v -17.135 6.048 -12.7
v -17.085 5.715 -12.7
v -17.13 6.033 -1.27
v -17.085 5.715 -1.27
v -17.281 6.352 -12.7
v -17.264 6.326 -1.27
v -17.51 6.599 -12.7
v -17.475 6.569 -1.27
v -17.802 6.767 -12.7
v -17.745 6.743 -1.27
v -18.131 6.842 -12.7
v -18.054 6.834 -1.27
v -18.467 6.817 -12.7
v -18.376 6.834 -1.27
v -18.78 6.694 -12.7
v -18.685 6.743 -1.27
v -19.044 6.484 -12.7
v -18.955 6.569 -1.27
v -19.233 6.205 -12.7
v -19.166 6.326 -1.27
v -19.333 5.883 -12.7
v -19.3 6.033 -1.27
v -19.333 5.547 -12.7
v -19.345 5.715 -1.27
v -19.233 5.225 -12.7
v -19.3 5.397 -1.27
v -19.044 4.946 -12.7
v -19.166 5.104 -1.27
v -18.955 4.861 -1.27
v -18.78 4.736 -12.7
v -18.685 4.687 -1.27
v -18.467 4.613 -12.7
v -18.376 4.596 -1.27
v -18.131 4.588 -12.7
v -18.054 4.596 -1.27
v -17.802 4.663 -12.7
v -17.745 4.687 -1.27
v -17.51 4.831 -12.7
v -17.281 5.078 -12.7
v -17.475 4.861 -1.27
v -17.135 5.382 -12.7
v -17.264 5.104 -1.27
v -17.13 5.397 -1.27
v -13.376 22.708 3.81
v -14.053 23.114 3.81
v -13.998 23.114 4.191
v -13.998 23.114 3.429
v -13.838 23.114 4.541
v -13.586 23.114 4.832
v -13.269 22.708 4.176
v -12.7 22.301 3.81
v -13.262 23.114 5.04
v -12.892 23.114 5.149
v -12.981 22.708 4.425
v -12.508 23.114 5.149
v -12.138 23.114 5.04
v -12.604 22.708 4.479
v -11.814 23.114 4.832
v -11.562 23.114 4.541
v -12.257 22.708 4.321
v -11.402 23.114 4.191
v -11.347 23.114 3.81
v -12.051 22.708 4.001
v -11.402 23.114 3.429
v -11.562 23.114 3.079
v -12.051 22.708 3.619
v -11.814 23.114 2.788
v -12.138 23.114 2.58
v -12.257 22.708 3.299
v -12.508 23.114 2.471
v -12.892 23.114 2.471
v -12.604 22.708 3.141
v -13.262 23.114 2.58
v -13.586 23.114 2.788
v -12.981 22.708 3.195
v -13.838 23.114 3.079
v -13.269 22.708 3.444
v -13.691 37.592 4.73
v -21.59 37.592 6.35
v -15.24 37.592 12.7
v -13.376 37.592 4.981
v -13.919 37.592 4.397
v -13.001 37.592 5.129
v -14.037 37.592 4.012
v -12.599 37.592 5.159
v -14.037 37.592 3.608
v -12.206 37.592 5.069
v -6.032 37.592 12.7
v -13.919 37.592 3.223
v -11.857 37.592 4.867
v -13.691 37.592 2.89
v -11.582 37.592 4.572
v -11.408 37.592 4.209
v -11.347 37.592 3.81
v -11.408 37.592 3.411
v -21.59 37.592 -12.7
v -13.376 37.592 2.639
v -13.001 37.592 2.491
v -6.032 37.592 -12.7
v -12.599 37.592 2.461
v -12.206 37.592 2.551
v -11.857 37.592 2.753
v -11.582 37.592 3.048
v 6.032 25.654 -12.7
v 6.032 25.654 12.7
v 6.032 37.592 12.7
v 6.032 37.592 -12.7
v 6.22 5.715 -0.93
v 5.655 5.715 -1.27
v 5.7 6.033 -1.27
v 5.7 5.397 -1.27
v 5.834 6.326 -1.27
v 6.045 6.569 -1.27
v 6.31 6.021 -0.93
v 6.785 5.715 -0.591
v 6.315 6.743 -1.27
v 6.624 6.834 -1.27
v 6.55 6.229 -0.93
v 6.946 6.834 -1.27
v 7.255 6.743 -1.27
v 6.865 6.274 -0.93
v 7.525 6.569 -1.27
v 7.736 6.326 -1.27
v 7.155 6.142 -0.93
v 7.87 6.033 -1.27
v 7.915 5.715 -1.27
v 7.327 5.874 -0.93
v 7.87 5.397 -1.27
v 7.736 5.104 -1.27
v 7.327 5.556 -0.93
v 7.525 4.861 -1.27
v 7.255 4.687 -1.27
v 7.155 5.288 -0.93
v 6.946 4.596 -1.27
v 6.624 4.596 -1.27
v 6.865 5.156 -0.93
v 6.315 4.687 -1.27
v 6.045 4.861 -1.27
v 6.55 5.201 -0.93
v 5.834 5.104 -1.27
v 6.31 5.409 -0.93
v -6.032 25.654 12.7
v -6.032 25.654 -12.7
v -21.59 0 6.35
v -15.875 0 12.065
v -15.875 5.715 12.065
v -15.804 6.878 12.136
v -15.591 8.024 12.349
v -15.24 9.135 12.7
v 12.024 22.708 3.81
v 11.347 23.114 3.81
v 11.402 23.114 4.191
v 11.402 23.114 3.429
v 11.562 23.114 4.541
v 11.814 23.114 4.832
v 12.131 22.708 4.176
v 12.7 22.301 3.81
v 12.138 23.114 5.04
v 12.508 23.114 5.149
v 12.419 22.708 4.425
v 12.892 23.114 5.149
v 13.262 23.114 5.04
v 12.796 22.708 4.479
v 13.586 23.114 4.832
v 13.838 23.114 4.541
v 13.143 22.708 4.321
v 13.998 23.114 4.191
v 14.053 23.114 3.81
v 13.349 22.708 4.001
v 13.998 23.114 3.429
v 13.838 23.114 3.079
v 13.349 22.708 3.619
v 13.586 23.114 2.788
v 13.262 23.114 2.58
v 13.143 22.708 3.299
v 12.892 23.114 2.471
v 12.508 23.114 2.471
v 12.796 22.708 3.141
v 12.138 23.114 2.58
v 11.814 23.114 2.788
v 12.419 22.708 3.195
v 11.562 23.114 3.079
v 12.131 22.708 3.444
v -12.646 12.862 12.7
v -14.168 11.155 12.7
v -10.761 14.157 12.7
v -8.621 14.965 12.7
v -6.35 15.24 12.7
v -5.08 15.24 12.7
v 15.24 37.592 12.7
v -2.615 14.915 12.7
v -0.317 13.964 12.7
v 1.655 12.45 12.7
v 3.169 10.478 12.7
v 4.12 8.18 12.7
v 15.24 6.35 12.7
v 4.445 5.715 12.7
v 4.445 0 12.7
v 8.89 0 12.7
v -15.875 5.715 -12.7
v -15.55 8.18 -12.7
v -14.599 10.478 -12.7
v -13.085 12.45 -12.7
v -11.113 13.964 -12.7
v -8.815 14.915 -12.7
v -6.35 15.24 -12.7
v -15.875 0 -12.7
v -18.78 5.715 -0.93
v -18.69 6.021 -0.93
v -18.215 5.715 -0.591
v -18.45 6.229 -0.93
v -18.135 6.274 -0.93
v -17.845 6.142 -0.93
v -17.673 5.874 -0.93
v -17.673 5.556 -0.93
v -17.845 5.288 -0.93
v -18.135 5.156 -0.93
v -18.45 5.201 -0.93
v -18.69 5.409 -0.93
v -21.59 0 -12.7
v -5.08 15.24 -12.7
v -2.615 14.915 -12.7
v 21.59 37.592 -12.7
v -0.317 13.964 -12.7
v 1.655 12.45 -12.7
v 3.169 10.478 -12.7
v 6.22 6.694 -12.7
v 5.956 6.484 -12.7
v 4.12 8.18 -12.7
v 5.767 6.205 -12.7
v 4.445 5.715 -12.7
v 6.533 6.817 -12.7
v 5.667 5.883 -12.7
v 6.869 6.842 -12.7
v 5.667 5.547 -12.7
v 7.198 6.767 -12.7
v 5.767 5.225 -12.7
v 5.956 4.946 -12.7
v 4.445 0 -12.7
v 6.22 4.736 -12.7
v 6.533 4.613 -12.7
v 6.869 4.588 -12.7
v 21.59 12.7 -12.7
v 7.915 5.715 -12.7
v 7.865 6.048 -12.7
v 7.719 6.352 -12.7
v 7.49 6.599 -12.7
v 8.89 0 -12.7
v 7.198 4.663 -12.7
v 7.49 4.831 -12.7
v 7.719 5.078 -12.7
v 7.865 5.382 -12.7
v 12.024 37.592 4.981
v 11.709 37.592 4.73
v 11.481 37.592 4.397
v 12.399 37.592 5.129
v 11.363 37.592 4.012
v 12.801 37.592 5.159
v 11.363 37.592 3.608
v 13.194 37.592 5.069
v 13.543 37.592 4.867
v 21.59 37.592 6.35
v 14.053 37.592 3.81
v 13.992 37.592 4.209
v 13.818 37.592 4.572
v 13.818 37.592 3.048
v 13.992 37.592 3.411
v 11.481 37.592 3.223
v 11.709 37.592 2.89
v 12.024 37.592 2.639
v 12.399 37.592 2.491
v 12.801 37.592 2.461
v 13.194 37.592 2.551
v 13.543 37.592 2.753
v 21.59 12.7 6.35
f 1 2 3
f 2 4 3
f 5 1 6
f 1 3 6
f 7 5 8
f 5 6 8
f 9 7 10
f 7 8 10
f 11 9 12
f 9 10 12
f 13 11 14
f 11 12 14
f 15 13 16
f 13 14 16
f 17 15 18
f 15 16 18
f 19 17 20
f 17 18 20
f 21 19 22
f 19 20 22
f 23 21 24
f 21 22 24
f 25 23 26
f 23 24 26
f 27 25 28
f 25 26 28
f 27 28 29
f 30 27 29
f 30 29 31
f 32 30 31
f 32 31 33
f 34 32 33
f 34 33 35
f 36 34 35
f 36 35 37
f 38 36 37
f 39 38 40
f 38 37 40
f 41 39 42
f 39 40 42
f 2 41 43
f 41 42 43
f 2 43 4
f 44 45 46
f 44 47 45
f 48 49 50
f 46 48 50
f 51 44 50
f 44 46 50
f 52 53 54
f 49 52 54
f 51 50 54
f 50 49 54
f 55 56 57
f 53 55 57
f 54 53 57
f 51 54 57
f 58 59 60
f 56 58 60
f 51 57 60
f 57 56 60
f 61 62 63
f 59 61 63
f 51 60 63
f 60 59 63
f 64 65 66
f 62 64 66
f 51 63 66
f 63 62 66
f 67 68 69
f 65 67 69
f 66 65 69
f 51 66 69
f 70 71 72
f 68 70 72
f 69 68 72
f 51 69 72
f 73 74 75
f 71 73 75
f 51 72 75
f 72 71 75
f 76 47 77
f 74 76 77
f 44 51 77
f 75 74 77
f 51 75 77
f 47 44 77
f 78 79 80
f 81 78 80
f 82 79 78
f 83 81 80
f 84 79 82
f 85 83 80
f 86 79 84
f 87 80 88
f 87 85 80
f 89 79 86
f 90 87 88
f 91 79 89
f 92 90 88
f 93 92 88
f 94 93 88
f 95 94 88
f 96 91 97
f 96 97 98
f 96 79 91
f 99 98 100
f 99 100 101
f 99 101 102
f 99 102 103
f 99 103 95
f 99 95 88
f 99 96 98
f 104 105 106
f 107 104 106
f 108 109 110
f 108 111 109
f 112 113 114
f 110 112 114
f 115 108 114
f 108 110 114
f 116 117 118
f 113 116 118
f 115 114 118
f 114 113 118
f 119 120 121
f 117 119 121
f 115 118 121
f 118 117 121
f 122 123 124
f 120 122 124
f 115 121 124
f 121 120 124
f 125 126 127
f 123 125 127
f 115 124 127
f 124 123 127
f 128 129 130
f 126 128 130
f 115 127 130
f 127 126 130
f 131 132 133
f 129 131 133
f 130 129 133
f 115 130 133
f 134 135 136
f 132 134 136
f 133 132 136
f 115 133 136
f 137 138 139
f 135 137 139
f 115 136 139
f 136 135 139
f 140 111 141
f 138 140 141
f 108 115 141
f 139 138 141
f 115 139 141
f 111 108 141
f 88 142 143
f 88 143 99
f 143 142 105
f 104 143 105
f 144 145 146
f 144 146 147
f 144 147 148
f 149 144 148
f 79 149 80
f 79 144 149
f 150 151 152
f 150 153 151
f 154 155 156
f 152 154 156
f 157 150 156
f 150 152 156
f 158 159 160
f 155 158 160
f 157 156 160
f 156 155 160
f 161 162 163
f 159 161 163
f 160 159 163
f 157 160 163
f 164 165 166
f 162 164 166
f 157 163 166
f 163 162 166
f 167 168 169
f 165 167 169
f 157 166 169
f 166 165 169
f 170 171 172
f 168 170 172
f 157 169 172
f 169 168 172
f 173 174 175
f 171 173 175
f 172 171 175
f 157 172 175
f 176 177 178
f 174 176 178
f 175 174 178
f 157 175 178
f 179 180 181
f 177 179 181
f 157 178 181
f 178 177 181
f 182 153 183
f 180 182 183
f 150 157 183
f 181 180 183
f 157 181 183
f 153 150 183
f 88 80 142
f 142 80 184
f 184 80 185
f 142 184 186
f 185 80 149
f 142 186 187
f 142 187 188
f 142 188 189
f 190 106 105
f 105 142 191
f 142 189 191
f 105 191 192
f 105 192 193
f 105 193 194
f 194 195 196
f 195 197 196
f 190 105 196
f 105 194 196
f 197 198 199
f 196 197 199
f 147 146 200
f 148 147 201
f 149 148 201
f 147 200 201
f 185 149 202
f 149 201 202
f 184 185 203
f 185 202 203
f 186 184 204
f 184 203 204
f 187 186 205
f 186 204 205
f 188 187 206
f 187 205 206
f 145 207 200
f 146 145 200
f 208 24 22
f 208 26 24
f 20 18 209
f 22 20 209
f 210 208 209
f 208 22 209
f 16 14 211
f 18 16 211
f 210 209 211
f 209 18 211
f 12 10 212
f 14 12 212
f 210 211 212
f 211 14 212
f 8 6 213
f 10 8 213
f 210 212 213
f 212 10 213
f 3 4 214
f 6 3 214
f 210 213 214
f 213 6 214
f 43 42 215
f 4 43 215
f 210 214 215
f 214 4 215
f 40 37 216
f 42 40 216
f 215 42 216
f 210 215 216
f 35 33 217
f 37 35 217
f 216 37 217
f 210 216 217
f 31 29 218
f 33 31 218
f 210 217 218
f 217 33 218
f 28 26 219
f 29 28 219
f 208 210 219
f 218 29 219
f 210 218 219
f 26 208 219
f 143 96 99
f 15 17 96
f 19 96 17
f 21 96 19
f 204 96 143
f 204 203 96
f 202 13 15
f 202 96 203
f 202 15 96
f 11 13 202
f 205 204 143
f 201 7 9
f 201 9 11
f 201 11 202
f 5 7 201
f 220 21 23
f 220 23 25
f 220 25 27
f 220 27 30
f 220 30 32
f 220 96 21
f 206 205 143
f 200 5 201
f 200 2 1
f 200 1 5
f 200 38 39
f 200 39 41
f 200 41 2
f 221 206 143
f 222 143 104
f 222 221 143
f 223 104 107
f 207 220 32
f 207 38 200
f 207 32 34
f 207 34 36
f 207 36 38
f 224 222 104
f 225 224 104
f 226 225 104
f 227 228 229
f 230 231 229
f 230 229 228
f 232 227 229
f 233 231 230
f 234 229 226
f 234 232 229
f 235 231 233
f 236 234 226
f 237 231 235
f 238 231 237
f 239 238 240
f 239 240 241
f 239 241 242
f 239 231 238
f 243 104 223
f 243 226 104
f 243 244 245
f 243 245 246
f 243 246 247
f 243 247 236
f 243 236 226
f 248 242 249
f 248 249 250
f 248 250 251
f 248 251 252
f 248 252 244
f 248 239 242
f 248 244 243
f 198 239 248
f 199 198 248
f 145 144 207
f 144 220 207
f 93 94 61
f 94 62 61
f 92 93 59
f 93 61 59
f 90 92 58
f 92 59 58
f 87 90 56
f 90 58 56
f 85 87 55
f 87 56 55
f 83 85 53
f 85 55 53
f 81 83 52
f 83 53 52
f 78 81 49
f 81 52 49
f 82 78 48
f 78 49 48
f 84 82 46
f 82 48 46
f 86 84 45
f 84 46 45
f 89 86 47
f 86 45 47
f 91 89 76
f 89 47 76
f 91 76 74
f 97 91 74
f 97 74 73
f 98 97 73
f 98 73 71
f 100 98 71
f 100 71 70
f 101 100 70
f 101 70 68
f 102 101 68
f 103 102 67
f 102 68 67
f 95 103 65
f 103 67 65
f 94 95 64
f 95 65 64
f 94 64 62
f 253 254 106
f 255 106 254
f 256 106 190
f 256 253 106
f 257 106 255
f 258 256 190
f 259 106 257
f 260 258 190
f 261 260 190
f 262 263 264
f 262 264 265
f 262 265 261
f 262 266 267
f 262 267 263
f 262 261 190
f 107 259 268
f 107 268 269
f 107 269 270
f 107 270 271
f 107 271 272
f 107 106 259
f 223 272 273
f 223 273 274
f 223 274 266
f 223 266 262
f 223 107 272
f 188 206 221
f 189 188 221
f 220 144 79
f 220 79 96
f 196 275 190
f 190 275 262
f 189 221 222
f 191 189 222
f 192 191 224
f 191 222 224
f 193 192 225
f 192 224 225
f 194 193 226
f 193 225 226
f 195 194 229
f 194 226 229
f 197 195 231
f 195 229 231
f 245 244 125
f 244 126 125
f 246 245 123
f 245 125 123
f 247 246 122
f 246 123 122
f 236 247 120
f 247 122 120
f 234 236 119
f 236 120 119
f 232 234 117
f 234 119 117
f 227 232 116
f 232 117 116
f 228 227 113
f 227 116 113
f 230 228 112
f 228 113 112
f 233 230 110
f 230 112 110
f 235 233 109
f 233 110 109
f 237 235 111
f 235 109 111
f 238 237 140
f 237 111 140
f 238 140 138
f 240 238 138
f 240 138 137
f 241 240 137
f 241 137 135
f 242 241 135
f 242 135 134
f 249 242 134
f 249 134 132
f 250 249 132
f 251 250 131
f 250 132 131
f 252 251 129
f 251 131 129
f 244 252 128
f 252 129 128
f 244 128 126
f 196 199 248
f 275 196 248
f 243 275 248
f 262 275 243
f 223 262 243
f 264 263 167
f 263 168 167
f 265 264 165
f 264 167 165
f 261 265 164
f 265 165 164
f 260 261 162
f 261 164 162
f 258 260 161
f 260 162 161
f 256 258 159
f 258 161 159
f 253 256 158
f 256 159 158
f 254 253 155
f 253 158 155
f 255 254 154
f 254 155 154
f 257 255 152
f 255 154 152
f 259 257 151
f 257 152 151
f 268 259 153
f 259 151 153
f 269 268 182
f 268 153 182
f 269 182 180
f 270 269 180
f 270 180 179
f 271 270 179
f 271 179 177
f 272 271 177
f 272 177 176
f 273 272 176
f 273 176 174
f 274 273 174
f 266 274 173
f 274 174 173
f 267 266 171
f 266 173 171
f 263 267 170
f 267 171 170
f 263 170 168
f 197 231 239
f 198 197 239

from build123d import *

# Parameters (mm, degrees)
SKETCH1_W                 = 43.18
SKETCH1_H                 = 25.4
BASE_DEPTH                = 37.592
SIDECHAMFER_SIZE          = 12.7
BACKCHAMFERS_SIZE         = 6.35
SKETCH2_W                 = 12.065
SKETCH2_H                 = 11.938
LINACTSLOT_DEPTH          = 51.24387091
MOUTINGHOLES_D            = 2.7051
MOUTINGHOLES_DEPTH        = 14.478
MOUTINGHOLES_TIP          = 0.81269403
MOTORSLOT_DEPTH           = 51.24387091
MOTORMOUNTINGHOLES2_D     = 2.2606
MOTORMOUNTINGHOLES2_DEPTH = 11.43
MOTORMOUNTINGHOLES2_TIP   = 0.679152758


with BuildPart() as part:
    # Sketch1 → Base (new body)
    with BuildSketch(Plane(origin=(0, 0, 0), x_dir=(1, 0, 0), z_dir=(0, 1, 0))):
        Rectangle(SKETCH1_W, SKETCH1_H)
    extrude(amount=BASE_DEPTH)

    # SideChamfer
    sidechamfer_edges = [part.edges().sort_by_distance(p)[0] for p in [
        (21.59, 0, 0),
    ]]
    chamfer(sidechamfer_edges, length=SIDECHAMFER_SIZE)

    # BackChamfers
    backchamfers_edges = [part.edges().sort_by_distance(p)[0] for p in [
        (21.59, 25.146, 12.7),
        (-21.59, 18.796, 12.7),
    ]]
    chamfer(backchamfers_edges, length=BACKCHAMFERS_SIZE)

    # Sketch2 → LinActSlot (cut, through all)
    with BuildSketch(Plane.XY.offset(12.7)):
        with Locations((0, 31.623)):
            Rectangle(SKETCH2_W, SKETCH2_H)
    extrude(amount=-LINACTSLOT_DEPTH, mode=Mode.SUBTRACT)

    # MoutingHoles
    with Locations(Plane(origin=(14.160350453, 37.592, 8.373414988), x_dir=(-1, 0, 0), z_dir=(0, 1, 0))):
        with Locations((1.460350453, -4.563414988), (26.860350453, -4.563414988)):
            Hole(MOUTINGHOLES_D / 2, depth=MOUTINGHOLES_DEPTH)
            with Locations((0, 0, -(MOUTINGHOLES_DEPTH + MOUTINGHOLES_TIP / 2))):  # 118° drill point
                Cone(0, MOUTINGHOLES_D / 2, MOUTINGHOLES_TIP, mode=Mode.SUBTRACT)

    # Sketch11 → MotorSlot (cut, through all)
    with BuildSketch(Plane(origin=(0, 0, -12.7), x_dir=(-1, 0, 0), z_dir=(0, 0, -1))):
        with BuildLine():
            Line((15.875, 5.08), (15.875, 5.715))
            ThreePointArc((15.875, 5.715), (13.085192091, 12.450192091), (6.35, 15.24))
            Line((6.35, 15.24), (5.08, 15.24))
            ThreePointArc((5.08, 15.24), (-1.655192091, 12.450192091), (-4.445, 5.715))
            Line((-4.445, 5.715), (-4.445, 5.08))
            Line((-4.445, 5.08), (-4.445, 0))
            Line((-4.445, 0), (15.875, 0))
            Line((15.875, 0), (15.875, 5.08))
        make_face()
    extrude(amount=-MOTORSLOT_DEPTH, mode=Mode.SUBTRACT)

    # MotorMountingHoles2
    with Locations(Plane(origin=(0, 0, -12.7), x_dir=(-1, 0, 0), z_dir=(0, 0, -1))):
        with Locations((18.215, 5.715), (-6.785, 5.715)):
            Hole(MOTORMOUNTINGHOLES2_D / 2, depth=MOTORMOUNTINGHOLES2_DEPTH)
            with Locations((0, 0, -(MOTORMOUNTINGHOLES2_DEPTH + MOTORMOUNTINGHOLES2_TIP / 2))):  # 118° drill point
                Cone(0, MOTORMOUNTINGHOLES2_D / 2, MOTORMOUNTINGHOLES2_TIP, mode=Mode.SUBTRACT)


solid = part.part
